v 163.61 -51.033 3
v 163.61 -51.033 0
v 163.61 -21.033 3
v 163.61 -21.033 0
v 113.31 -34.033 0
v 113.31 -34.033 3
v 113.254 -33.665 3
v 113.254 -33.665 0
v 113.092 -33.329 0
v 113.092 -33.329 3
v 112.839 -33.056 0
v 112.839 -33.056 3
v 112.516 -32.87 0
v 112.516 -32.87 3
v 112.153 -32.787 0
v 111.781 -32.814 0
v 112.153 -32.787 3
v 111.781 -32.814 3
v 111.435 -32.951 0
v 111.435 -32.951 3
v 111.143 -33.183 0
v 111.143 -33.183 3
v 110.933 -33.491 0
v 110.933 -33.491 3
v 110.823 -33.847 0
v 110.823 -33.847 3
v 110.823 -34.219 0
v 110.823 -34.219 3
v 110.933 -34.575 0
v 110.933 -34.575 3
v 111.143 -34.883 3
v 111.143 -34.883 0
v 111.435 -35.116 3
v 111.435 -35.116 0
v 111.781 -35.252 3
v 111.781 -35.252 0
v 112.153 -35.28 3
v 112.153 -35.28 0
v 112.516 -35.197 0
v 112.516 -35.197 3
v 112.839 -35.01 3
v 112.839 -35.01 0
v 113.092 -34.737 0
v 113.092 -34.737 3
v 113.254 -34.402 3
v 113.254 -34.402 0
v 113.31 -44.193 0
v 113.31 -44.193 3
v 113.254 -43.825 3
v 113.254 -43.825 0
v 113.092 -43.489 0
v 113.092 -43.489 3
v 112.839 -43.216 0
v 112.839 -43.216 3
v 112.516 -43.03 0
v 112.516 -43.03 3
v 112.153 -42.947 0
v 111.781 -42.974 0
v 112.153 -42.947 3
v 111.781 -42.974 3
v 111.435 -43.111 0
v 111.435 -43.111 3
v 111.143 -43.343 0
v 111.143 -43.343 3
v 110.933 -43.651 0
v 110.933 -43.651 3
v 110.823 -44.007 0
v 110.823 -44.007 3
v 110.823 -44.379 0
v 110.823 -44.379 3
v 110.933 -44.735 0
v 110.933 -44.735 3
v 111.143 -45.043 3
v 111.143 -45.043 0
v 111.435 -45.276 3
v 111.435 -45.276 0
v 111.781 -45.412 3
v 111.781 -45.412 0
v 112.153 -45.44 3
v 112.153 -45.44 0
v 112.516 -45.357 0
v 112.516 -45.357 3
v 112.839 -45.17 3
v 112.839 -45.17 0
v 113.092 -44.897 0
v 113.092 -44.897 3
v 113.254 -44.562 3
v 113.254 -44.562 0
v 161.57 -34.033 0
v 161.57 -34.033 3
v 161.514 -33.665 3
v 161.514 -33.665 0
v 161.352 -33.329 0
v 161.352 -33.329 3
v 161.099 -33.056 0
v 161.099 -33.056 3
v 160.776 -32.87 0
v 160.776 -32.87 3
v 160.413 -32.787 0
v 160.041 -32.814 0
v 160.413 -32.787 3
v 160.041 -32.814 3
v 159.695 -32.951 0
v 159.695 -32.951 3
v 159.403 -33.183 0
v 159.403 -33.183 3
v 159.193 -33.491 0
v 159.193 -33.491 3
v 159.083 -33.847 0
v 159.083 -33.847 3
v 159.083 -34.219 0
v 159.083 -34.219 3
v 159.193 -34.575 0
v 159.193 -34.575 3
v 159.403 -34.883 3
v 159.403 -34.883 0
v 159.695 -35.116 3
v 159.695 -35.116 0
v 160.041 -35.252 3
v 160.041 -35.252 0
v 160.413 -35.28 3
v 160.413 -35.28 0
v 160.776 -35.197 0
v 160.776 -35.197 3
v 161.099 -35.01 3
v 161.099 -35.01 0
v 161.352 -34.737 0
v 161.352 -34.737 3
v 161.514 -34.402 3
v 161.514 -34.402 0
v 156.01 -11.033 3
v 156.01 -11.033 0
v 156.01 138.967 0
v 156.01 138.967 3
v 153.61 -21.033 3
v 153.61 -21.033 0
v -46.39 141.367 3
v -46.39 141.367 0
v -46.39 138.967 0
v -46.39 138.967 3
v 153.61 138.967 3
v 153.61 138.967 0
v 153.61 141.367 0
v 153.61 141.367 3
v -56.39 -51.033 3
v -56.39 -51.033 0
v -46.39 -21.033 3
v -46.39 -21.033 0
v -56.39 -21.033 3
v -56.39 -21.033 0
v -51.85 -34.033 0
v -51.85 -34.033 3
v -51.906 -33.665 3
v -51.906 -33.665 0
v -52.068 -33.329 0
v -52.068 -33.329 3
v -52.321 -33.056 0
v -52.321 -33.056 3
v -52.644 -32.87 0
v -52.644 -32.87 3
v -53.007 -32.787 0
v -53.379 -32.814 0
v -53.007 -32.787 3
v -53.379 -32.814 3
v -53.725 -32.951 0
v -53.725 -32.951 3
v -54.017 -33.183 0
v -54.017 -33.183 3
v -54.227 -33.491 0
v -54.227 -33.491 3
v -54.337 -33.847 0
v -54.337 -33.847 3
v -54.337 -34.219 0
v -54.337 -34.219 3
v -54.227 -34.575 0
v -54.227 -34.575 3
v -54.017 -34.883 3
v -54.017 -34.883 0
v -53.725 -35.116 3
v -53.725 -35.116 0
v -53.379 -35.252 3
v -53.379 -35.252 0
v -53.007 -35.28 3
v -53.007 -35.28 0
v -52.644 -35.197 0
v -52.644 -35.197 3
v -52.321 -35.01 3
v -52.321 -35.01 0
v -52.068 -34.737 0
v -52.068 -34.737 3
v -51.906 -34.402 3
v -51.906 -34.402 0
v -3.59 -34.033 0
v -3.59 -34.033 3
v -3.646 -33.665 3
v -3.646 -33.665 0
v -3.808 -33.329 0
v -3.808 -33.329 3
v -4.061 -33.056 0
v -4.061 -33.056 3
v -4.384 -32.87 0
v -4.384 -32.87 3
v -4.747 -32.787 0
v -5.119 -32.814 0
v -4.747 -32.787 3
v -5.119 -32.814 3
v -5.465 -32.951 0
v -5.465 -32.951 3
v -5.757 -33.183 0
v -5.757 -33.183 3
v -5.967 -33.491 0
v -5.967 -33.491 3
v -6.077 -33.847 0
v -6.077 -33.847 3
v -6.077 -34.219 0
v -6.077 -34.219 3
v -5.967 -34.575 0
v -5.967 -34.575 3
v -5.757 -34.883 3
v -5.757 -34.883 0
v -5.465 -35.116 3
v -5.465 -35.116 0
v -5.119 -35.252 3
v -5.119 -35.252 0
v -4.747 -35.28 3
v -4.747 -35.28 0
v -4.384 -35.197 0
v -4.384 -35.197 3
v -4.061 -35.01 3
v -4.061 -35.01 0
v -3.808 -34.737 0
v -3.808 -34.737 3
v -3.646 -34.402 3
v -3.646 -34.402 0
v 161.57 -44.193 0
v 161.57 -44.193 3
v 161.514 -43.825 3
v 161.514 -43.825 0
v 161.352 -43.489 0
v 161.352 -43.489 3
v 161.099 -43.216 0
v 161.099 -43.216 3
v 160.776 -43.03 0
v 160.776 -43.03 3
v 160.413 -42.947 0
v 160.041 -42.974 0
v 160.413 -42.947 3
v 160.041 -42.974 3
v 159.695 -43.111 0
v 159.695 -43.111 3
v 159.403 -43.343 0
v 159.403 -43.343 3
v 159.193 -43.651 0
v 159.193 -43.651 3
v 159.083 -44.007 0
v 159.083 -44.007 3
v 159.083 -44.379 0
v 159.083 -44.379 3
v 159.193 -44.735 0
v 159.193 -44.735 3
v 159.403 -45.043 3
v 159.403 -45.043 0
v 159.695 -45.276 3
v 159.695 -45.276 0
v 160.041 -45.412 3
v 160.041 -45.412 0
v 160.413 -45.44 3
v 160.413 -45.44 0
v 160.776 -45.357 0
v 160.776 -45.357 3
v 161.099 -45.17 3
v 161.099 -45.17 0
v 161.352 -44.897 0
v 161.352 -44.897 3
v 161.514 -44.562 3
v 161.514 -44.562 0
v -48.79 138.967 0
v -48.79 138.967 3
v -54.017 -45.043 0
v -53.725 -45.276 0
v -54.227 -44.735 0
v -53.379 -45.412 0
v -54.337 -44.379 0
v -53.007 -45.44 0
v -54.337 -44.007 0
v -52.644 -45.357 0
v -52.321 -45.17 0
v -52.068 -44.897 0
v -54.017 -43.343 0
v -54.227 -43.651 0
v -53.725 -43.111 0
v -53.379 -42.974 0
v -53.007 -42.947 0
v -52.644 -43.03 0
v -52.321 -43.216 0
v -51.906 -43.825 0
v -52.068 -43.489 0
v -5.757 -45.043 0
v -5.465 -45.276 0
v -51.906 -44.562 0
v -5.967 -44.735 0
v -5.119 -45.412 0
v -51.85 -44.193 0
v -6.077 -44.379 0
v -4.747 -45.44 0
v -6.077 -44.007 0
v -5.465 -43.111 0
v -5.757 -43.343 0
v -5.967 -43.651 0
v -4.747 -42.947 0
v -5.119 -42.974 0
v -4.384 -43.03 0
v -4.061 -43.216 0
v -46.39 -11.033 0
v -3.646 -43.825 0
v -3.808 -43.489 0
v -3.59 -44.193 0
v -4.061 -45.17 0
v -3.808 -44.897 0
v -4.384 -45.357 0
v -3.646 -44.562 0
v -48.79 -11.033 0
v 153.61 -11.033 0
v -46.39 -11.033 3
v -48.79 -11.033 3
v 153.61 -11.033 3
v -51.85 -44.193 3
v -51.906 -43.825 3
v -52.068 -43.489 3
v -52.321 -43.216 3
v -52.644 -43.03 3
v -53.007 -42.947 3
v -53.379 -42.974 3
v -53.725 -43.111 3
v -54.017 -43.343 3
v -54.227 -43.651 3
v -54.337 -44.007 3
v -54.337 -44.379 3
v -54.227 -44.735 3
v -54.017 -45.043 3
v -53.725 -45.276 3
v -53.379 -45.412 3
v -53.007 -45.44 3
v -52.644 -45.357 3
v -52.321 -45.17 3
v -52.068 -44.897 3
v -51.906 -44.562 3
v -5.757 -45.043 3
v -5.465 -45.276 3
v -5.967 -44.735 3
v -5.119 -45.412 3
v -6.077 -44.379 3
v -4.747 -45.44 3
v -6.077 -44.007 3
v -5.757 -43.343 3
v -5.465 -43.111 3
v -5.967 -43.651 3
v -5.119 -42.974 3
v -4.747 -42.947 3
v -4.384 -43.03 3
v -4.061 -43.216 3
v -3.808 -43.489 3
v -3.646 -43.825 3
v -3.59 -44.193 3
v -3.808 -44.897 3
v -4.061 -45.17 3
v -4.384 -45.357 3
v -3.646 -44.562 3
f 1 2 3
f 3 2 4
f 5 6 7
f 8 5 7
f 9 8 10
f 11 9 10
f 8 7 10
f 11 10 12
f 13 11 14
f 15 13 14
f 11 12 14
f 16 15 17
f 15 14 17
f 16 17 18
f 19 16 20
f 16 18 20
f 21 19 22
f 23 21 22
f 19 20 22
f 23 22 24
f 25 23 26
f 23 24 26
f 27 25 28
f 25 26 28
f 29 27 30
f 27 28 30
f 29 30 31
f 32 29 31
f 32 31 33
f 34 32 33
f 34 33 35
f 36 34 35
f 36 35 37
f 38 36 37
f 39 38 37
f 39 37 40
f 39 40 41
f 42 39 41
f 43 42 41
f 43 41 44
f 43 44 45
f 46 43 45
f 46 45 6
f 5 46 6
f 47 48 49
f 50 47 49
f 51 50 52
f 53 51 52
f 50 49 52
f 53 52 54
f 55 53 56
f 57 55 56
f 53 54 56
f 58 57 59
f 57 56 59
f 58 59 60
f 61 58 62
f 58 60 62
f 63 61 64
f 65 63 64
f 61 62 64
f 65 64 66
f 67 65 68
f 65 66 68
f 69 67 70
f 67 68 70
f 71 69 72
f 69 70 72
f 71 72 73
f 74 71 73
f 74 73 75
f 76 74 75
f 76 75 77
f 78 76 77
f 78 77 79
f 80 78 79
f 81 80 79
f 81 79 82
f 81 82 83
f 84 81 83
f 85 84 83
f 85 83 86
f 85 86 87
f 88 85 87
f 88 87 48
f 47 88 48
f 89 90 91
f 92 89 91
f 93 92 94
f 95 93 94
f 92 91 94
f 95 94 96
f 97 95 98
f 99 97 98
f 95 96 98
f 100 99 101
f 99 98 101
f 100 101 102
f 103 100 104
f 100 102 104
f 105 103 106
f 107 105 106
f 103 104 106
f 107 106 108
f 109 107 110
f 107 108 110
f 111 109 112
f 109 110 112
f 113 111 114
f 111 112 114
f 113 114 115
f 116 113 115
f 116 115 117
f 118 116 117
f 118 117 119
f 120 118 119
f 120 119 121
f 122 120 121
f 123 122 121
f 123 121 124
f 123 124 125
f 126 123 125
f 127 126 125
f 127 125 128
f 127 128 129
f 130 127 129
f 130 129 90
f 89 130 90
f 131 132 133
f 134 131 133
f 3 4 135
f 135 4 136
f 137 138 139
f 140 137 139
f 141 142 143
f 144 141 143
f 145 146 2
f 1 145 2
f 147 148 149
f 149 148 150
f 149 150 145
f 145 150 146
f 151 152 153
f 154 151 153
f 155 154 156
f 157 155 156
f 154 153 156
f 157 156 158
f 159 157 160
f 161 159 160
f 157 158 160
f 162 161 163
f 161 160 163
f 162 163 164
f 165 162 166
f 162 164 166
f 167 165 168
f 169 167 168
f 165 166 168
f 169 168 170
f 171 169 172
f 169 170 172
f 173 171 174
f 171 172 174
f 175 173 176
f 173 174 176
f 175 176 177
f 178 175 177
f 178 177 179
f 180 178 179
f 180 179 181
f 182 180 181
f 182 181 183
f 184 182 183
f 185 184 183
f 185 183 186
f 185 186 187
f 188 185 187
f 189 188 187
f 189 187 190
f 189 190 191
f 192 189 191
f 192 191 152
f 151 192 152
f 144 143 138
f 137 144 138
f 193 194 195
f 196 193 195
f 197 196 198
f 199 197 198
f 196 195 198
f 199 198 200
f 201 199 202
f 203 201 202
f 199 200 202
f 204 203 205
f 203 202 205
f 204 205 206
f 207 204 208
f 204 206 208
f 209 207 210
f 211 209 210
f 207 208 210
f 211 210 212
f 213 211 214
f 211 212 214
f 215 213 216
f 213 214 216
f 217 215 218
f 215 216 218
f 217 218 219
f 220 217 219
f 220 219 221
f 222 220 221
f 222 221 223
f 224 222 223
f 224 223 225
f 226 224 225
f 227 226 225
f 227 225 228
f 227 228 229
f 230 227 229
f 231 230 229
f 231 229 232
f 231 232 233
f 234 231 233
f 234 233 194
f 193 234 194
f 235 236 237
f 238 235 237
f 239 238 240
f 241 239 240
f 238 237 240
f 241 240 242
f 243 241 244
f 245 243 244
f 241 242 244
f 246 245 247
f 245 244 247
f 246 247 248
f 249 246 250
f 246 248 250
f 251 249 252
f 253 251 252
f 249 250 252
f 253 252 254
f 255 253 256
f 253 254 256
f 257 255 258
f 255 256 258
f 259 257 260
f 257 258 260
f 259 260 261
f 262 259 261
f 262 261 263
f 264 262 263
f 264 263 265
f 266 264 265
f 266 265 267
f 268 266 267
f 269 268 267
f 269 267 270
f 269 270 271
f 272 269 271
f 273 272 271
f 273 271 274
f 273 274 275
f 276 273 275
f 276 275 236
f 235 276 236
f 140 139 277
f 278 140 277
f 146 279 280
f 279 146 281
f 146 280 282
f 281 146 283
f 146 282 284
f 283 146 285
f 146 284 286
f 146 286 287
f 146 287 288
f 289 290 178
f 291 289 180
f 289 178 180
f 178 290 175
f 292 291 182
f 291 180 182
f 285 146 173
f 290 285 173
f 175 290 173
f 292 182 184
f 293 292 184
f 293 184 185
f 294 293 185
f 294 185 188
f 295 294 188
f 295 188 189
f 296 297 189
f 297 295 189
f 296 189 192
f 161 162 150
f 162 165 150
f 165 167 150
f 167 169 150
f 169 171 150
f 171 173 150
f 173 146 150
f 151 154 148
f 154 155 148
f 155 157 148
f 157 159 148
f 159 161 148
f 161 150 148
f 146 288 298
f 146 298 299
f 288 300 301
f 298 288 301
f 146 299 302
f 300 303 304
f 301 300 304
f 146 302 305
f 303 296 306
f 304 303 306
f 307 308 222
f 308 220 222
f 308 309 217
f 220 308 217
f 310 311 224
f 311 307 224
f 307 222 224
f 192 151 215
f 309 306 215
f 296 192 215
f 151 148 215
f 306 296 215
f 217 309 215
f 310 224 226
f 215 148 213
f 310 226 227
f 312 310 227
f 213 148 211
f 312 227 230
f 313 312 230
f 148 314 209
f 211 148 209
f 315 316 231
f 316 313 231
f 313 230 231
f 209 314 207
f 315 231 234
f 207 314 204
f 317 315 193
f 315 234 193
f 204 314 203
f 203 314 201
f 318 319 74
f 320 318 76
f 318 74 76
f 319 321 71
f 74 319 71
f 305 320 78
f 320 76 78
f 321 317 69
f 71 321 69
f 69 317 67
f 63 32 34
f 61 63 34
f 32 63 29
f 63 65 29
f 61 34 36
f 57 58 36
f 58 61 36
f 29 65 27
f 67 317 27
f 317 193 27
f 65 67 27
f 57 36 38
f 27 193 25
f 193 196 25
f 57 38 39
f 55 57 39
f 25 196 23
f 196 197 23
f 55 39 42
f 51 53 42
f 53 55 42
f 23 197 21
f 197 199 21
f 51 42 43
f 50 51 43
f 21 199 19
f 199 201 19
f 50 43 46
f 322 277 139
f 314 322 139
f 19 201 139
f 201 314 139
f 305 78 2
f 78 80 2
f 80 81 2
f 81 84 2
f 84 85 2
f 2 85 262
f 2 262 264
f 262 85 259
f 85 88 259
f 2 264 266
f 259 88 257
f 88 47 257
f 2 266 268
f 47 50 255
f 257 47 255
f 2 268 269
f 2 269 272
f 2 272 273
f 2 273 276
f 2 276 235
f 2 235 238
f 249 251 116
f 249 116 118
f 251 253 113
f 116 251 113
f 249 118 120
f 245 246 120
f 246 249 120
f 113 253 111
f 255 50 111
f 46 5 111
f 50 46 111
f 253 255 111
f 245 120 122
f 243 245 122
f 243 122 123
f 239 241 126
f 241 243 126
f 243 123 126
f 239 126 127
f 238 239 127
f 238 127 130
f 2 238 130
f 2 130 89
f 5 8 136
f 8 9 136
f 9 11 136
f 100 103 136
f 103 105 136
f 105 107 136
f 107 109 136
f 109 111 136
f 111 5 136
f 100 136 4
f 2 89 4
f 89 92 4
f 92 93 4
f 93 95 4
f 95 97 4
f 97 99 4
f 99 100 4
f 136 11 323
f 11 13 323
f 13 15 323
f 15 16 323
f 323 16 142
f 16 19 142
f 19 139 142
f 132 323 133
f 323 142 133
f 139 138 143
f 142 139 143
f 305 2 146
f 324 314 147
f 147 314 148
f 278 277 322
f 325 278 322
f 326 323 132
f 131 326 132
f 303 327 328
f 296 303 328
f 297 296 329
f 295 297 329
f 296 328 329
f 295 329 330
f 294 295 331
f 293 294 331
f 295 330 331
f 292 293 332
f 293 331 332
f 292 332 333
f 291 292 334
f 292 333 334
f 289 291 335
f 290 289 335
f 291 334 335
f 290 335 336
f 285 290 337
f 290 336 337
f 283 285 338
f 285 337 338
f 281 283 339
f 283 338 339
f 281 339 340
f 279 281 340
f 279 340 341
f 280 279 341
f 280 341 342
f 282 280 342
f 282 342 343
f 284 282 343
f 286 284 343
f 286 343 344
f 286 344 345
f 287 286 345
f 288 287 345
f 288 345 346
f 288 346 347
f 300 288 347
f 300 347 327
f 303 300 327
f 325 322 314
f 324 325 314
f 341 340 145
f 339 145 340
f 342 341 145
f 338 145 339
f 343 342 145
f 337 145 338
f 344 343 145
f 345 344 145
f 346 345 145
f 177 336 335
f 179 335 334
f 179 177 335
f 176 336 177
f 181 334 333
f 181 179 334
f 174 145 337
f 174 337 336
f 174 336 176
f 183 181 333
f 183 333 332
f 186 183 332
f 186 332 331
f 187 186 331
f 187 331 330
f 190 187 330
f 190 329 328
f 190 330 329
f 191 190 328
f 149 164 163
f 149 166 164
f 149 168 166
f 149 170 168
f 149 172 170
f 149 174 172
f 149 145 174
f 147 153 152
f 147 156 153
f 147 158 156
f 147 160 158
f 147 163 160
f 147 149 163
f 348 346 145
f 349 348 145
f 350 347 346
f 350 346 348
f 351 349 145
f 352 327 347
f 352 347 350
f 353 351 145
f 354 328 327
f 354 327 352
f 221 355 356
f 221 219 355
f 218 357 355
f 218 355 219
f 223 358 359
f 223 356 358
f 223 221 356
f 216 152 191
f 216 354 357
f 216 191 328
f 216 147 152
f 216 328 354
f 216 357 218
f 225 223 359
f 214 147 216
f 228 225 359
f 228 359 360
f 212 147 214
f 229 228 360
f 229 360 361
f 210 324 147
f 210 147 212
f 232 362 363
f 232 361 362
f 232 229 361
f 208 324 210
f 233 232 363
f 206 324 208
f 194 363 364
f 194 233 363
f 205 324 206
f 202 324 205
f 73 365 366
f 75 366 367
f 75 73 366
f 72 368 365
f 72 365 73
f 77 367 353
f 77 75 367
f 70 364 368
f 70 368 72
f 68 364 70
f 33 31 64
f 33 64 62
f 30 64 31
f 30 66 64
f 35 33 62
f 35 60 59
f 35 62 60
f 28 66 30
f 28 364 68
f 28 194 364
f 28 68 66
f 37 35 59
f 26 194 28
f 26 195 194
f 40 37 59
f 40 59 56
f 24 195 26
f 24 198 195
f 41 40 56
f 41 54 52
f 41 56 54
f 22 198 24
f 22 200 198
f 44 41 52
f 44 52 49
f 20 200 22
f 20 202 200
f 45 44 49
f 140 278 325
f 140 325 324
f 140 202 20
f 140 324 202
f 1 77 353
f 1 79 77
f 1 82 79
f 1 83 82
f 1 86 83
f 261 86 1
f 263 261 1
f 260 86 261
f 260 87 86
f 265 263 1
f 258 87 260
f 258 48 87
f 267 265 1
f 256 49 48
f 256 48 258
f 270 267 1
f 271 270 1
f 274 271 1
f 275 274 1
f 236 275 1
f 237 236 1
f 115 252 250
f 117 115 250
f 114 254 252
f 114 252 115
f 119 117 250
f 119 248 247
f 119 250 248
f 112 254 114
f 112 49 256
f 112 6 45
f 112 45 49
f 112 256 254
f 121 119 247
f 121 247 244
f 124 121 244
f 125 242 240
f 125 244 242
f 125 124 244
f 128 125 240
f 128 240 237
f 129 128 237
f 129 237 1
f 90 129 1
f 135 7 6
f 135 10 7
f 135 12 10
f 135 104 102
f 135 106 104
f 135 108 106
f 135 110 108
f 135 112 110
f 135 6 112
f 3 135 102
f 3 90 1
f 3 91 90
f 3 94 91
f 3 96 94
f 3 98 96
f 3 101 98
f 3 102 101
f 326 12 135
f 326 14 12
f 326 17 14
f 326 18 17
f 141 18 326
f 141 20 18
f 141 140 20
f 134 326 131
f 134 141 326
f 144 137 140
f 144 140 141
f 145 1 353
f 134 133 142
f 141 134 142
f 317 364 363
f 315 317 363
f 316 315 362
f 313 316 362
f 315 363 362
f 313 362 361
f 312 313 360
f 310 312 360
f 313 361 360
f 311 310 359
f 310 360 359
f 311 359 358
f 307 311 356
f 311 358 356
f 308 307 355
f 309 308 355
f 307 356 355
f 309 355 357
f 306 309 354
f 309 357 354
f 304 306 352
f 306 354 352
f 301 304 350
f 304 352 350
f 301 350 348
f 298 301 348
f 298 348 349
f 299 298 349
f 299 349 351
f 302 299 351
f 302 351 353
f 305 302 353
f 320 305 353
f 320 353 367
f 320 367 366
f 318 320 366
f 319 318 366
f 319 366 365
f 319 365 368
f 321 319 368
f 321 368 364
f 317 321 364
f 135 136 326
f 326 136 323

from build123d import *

# Parameters (mm, degrees)
BOSS_EXTRU_1_DEPTH      = 3
ESQUISSE2_R             = 1.25
ENL_V_MAT_EXTRU_1_DEPTH = 10


with BuildPart() as part:
    # Esquisse1 → Boss.-Extru.1 (new body)
    with BuildSketch(Plane.XY):
        Polygon((-56.390469464, -21.033092325), (-56.390469464, -51.033092325), (163.609530536, -51.033092325), (163.609530536, -21.033092325), (153.609530536, -21.033092325), (153.609530536, -11.033092325), (156.009530536, -11.033092325), (156.009530536, 138.966907675), (153.609530536, 138.966907675), (153.609530536, 141.366907675), (-46.390469464, 141.366907675), (-46.390469464, 138.966907675), (-48.790469464, 138.966907675), (-48.790469464, -11.033092325), (-46.390469464, -11.033092325), (-46.390469464, -21.033092325), align=None)
    extrude(amount=BOSS_EXTRU_1_DEPTH)

    # Esquisse2 → Enlèv. mat.-Extru.1 (cut)
    with BuildSketch(Plane.XY.offset(3)):
        with Locations((160.319530536, -34.033092325)):
            Circle(ESQUISSE2_R)
        with Locations((112.059530536, -34.033092325)):
            Circle(ESQUISSE2_R)
        with Locations((160.319530536, -44.193092325)):
            Circle(ESQUISSE2_R)
        with Locations((112.059530536, -44.193092325)):
            Circle(ESQUISSE2_R)
        with Locations((-4.840469464, -44.193092325)):
            Circle(ESQUISSE2_R)
        with Locations((-53.100469464, -44.193092325)):
            Circle(ESQUISSE2_R)
        with Locations((-4.840469464, -34.033092325)):
            Circle(ESQUISSE2_R)
        with Locations((-53.100469464, -34.033092325)):
            Circle(ESQUISSE2_R)
    extrude(amount=-ENL_V_MAT_EXTRU_1_DEPTH, mode=Mode.SUBTRACT)


solid = part.part
